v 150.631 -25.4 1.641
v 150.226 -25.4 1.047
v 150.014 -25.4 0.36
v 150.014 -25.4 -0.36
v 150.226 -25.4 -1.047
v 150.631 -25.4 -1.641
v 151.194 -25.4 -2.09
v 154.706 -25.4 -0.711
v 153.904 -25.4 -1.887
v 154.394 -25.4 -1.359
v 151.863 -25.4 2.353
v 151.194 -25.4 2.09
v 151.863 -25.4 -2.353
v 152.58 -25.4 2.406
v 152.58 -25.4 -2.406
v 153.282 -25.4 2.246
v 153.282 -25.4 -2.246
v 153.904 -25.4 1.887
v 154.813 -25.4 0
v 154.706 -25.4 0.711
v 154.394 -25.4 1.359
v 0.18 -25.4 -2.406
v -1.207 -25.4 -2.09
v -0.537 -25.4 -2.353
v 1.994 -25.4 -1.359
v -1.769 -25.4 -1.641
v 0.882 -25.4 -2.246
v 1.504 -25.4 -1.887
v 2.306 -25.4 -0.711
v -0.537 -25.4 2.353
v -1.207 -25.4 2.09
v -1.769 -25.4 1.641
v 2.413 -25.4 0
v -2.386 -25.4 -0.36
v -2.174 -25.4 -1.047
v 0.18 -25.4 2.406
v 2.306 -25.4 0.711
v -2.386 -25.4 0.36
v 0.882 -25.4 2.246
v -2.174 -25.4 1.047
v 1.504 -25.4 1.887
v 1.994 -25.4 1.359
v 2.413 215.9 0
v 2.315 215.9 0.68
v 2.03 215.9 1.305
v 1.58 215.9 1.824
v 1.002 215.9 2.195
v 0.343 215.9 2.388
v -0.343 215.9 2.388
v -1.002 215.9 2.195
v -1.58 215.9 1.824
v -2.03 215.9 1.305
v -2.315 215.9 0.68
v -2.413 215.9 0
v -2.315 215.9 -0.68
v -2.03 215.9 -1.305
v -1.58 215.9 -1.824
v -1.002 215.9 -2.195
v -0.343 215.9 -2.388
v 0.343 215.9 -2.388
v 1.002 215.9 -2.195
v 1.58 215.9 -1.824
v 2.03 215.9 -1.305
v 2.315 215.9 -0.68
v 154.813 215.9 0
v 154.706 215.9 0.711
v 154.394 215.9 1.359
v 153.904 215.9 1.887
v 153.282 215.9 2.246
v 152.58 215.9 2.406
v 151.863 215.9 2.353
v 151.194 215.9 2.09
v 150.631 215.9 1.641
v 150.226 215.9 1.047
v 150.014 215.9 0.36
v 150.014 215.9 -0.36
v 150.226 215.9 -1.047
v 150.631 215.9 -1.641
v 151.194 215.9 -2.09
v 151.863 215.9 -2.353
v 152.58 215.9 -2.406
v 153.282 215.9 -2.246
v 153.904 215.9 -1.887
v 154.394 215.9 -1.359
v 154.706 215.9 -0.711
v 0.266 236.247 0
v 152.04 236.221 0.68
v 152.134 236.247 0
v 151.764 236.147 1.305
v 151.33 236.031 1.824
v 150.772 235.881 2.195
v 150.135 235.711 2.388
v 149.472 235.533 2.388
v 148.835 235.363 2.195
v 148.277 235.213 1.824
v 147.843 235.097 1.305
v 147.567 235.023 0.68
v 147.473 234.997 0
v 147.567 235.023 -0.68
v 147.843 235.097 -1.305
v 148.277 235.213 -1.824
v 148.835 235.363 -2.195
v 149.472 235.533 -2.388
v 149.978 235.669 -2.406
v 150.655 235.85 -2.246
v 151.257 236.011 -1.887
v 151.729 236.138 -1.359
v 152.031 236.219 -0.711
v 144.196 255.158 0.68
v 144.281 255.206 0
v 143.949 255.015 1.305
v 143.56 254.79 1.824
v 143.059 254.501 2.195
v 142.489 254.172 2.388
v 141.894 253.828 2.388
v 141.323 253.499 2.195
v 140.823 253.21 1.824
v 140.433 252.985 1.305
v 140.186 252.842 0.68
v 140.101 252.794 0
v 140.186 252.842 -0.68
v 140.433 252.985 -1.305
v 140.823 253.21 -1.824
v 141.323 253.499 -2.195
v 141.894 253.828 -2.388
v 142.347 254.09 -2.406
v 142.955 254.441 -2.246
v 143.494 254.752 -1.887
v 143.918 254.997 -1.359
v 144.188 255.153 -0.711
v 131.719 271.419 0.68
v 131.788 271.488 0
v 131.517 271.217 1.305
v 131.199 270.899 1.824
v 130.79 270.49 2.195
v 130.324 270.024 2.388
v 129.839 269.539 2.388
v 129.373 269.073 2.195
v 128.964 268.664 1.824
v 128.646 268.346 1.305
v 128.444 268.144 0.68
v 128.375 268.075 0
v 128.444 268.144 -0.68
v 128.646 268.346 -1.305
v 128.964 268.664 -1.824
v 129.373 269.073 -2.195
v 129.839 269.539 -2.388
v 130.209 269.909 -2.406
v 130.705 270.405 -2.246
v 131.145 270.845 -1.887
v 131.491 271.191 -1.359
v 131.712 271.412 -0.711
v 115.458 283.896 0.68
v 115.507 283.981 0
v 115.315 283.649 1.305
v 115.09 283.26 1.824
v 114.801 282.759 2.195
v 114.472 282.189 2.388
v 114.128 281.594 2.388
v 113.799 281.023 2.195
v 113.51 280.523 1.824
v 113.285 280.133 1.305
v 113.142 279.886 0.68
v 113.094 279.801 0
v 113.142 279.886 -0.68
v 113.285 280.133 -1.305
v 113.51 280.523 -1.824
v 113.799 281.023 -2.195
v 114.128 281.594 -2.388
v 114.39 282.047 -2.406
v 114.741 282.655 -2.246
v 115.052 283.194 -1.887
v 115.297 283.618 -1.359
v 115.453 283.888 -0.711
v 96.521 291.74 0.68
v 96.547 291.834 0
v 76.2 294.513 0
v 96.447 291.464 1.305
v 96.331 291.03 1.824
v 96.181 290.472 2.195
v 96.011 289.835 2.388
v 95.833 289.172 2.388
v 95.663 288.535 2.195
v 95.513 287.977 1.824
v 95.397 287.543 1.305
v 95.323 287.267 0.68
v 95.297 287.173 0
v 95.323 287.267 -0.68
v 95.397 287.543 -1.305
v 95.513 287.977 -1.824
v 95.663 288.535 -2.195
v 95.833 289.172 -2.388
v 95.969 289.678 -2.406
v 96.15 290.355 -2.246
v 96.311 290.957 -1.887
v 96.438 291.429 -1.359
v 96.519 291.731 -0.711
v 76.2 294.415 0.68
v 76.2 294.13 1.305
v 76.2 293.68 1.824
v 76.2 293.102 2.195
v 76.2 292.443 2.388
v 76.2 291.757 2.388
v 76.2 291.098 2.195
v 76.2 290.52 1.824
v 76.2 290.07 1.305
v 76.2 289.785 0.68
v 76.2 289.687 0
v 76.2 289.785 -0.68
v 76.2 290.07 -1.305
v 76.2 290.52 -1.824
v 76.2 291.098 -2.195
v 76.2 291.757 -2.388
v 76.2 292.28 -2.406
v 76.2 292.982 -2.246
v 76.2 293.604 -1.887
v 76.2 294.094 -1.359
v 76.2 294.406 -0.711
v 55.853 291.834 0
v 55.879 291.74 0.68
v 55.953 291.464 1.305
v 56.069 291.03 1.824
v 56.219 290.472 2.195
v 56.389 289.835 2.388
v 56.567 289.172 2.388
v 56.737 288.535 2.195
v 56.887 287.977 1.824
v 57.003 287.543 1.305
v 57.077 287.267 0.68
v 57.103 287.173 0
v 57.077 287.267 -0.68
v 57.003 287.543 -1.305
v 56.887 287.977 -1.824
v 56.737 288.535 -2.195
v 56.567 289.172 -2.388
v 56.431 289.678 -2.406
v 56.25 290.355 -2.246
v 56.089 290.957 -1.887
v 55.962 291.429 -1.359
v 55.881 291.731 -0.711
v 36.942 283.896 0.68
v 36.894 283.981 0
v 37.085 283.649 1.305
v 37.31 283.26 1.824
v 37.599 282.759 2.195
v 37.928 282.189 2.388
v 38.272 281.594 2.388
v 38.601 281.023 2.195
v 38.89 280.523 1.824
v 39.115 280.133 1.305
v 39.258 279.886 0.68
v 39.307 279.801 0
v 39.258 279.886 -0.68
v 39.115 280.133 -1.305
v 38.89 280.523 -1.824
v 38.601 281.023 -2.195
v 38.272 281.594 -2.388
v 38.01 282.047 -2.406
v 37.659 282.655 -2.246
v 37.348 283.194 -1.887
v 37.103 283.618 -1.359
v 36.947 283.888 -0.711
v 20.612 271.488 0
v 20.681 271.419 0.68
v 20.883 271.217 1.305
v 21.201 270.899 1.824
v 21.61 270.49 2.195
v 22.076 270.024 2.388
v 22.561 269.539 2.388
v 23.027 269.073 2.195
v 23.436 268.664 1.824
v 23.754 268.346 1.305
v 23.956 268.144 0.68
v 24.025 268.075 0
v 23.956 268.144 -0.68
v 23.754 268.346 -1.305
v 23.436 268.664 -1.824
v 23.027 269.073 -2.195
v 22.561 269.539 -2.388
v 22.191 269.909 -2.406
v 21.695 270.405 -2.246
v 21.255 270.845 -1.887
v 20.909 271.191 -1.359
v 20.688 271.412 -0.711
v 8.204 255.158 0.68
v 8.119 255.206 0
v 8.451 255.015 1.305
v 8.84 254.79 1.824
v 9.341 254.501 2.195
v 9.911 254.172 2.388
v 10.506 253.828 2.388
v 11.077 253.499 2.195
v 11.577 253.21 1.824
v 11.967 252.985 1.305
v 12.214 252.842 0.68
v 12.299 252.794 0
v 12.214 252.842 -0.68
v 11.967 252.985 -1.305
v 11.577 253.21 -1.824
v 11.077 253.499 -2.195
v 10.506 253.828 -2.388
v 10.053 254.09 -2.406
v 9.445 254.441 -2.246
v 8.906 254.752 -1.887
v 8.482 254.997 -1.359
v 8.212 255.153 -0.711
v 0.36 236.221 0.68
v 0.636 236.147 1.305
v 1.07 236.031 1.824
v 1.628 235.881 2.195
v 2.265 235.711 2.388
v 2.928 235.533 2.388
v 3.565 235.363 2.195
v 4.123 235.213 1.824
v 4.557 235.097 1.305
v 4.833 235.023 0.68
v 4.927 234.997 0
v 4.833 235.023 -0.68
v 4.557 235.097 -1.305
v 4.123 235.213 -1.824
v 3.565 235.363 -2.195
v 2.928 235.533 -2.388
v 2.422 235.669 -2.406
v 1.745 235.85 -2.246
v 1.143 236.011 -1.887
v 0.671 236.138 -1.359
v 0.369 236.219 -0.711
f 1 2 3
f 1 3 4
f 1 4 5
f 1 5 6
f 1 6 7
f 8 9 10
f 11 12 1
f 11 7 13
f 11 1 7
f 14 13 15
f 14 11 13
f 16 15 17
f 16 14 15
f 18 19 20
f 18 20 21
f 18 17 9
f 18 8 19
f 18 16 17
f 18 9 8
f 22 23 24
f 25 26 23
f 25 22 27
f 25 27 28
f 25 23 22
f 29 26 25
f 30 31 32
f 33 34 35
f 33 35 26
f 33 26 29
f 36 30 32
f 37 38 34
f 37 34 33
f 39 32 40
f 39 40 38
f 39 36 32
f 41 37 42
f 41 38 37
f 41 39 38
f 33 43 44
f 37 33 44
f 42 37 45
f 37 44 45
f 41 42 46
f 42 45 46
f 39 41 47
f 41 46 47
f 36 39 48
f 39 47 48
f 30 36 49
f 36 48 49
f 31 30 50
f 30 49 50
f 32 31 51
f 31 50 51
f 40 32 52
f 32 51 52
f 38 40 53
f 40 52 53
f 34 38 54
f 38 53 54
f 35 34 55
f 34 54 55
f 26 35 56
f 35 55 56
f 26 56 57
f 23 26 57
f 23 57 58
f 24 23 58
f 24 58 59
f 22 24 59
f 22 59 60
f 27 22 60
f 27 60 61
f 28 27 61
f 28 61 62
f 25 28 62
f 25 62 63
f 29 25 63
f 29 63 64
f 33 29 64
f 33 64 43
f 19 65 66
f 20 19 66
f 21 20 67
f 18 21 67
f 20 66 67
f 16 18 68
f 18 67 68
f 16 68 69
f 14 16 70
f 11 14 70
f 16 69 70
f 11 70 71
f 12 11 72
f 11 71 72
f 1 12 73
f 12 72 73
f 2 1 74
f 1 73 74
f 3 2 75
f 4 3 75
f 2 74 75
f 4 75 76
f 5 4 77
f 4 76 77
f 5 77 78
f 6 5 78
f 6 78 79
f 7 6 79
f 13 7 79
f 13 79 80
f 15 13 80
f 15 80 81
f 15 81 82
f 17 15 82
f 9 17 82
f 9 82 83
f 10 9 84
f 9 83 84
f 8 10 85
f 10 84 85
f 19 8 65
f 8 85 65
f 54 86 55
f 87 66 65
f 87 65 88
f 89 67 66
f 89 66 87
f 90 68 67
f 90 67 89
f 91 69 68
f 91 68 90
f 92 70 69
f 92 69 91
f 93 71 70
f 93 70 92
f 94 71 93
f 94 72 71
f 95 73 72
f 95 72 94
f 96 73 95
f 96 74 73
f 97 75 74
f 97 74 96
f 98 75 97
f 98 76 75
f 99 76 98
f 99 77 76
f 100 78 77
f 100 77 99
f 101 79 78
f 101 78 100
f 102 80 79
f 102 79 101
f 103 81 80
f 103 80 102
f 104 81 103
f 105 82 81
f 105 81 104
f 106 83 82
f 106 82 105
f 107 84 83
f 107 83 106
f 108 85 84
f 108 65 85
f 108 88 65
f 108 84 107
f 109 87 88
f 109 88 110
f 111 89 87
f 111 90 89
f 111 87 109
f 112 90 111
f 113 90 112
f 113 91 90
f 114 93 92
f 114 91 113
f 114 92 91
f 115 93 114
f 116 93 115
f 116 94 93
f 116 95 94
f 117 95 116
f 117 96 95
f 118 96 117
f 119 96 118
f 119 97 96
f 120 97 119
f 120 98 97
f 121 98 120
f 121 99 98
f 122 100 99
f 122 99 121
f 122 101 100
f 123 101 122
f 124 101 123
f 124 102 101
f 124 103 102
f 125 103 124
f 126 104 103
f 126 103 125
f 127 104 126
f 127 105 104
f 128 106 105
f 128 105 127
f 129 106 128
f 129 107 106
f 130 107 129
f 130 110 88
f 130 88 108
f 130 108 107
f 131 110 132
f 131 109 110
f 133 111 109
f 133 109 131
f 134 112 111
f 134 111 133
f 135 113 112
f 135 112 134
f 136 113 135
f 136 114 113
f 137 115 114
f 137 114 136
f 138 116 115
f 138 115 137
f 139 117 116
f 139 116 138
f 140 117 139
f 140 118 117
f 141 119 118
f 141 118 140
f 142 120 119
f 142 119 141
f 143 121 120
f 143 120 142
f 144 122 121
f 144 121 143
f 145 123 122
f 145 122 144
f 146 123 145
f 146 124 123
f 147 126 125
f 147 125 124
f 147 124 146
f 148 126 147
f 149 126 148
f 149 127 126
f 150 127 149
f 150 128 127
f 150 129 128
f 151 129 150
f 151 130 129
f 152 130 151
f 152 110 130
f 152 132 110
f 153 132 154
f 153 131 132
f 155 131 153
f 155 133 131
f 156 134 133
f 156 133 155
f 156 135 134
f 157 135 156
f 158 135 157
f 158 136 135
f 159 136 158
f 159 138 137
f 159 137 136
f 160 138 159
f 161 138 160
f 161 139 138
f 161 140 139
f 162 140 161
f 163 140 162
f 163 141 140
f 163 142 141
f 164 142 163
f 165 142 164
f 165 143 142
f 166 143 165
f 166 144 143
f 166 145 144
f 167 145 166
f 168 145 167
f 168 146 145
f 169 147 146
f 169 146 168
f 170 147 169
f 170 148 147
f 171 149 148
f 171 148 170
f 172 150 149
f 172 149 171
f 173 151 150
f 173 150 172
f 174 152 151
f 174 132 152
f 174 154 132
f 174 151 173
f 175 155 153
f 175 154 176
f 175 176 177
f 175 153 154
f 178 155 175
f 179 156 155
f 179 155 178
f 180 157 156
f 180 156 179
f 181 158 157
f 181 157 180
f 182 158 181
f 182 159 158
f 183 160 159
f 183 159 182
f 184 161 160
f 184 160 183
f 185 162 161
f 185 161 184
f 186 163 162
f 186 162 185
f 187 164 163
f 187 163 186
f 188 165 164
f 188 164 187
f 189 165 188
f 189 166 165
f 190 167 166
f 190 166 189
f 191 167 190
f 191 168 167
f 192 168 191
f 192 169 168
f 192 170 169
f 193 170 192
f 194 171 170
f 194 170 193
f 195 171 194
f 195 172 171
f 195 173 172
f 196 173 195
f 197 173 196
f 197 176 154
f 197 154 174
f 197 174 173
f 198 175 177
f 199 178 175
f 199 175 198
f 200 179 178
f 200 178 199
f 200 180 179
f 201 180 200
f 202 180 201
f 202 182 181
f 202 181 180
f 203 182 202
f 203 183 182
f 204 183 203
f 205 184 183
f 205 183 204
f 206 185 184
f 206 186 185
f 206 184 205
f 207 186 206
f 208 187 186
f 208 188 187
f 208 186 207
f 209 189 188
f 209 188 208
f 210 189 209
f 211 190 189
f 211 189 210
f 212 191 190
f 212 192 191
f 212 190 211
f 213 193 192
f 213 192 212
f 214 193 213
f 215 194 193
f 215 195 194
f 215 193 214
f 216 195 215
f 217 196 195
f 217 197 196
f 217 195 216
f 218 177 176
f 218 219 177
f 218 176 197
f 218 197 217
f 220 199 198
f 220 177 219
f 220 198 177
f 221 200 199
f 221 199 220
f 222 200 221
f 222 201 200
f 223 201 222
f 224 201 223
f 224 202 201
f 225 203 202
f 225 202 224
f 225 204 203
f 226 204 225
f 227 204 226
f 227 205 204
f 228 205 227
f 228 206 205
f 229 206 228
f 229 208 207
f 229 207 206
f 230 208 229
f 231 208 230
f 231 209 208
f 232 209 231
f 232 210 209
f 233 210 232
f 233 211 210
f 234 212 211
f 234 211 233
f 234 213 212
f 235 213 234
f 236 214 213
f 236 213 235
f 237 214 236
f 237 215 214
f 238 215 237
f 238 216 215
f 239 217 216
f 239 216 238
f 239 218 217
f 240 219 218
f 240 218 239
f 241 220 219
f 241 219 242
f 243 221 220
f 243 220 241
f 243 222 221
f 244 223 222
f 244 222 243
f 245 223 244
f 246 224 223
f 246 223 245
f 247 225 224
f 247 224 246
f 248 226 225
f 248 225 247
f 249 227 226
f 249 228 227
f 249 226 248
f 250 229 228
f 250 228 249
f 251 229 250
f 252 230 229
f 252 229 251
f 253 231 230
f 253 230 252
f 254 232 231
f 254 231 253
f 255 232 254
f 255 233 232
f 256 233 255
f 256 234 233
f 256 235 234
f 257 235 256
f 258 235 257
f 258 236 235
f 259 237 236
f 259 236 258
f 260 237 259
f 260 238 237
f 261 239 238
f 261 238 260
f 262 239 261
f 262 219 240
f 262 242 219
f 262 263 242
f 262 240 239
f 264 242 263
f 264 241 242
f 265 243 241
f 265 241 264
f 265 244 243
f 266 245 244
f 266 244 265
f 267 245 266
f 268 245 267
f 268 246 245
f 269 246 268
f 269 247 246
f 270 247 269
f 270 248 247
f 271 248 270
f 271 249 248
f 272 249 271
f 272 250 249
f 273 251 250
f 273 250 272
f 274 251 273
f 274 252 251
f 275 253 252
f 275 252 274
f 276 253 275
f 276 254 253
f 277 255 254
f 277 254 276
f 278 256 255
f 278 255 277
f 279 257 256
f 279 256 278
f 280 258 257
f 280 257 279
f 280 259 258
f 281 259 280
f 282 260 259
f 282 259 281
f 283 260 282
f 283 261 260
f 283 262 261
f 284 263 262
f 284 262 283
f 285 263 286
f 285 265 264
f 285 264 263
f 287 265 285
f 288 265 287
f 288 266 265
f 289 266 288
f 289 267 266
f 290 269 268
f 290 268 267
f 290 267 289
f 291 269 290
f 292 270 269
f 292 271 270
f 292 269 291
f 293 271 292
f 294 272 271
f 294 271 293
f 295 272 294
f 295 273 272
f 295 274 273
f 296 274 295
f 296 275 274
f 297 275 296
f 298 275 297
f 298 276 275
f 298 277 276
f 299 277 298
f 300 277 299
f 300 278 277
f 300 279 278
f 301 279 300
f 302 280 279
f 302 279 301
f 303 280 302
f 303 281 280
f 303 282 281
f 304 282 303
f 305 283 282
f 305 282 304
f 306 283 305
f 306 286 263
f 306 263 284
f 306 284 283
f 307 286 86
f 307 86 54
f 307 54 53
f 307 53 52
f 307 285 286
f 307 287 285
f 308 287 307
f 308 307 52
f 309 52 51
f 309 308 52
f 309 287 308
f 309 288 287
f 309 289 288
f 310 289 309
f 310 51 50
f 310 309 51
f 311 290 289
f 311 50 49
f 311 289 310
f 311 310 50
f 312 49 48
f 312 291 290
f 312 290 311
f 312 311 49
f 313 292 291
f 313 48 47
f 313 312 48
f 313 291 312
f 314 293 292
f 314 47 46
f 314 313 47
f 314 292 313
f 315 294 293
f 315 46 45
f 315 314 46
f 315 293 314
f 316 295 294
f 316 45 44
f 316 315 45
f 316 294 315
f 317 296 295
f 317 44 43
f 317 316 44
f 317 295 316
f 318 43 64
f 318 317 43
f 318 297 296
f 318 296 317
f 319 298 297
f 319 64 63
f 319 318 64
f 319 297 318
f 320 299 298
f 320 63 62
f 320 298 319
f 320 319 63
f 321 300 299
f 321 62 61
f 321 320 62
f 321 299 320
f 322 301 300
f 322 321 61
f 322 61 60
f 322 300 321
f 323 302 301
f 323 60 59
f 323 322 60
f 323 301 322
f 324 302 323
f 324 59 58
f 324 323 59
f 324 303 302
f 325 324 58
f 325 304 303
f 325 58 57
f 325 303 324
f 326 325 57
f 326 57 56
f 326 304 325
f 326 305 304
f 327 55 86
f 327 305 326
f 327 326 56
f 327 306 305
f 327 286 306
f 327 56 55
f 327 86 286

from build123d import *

# Parameters (mm, degrees)
SKETCH1_R           = 2.413
REVOLVE1_ANGLE      = 180
SKETCH2_R           = 2.413
BOSS_EXTRUDE1_DEPTH = 241.3
SKETCH3_R           = 2.413
BOSS_EXTRUDE2_DEPTH = 241.3


with BuildPart() as part:
    # Sketch1 → Revolve1 (revolve)
    with BuildSketch(Plane.XZ.offset(-215.9)):
        with Locations((152.4, 0)):
            Circle(SKETCH1_R)
    revolve(axis=Axis((76.2, 215.9, 2.413), (0, 0, 1)), revolution_arc=REVOLVE1_ANGLE)

    # Sketch2 → Boss-Extrude1 (add)
    with BuildSketch(Plane.XZ.offset(-215.9)):
        with Locations((152.4, 0)):
            Circle(SKETCH2_R)
    extrude(amount=BOSS_EXTRUDE1_DEPTH)

    # Sketch3 → Boss-Extrude2 (add)
    with BuildSketch(Plane.XZ.offset(-215.9)):
        Circle(SKETCH3_R)
    extrude(amount=BOSS_EXTRUDE2_DEPTH)


solid = part.part
